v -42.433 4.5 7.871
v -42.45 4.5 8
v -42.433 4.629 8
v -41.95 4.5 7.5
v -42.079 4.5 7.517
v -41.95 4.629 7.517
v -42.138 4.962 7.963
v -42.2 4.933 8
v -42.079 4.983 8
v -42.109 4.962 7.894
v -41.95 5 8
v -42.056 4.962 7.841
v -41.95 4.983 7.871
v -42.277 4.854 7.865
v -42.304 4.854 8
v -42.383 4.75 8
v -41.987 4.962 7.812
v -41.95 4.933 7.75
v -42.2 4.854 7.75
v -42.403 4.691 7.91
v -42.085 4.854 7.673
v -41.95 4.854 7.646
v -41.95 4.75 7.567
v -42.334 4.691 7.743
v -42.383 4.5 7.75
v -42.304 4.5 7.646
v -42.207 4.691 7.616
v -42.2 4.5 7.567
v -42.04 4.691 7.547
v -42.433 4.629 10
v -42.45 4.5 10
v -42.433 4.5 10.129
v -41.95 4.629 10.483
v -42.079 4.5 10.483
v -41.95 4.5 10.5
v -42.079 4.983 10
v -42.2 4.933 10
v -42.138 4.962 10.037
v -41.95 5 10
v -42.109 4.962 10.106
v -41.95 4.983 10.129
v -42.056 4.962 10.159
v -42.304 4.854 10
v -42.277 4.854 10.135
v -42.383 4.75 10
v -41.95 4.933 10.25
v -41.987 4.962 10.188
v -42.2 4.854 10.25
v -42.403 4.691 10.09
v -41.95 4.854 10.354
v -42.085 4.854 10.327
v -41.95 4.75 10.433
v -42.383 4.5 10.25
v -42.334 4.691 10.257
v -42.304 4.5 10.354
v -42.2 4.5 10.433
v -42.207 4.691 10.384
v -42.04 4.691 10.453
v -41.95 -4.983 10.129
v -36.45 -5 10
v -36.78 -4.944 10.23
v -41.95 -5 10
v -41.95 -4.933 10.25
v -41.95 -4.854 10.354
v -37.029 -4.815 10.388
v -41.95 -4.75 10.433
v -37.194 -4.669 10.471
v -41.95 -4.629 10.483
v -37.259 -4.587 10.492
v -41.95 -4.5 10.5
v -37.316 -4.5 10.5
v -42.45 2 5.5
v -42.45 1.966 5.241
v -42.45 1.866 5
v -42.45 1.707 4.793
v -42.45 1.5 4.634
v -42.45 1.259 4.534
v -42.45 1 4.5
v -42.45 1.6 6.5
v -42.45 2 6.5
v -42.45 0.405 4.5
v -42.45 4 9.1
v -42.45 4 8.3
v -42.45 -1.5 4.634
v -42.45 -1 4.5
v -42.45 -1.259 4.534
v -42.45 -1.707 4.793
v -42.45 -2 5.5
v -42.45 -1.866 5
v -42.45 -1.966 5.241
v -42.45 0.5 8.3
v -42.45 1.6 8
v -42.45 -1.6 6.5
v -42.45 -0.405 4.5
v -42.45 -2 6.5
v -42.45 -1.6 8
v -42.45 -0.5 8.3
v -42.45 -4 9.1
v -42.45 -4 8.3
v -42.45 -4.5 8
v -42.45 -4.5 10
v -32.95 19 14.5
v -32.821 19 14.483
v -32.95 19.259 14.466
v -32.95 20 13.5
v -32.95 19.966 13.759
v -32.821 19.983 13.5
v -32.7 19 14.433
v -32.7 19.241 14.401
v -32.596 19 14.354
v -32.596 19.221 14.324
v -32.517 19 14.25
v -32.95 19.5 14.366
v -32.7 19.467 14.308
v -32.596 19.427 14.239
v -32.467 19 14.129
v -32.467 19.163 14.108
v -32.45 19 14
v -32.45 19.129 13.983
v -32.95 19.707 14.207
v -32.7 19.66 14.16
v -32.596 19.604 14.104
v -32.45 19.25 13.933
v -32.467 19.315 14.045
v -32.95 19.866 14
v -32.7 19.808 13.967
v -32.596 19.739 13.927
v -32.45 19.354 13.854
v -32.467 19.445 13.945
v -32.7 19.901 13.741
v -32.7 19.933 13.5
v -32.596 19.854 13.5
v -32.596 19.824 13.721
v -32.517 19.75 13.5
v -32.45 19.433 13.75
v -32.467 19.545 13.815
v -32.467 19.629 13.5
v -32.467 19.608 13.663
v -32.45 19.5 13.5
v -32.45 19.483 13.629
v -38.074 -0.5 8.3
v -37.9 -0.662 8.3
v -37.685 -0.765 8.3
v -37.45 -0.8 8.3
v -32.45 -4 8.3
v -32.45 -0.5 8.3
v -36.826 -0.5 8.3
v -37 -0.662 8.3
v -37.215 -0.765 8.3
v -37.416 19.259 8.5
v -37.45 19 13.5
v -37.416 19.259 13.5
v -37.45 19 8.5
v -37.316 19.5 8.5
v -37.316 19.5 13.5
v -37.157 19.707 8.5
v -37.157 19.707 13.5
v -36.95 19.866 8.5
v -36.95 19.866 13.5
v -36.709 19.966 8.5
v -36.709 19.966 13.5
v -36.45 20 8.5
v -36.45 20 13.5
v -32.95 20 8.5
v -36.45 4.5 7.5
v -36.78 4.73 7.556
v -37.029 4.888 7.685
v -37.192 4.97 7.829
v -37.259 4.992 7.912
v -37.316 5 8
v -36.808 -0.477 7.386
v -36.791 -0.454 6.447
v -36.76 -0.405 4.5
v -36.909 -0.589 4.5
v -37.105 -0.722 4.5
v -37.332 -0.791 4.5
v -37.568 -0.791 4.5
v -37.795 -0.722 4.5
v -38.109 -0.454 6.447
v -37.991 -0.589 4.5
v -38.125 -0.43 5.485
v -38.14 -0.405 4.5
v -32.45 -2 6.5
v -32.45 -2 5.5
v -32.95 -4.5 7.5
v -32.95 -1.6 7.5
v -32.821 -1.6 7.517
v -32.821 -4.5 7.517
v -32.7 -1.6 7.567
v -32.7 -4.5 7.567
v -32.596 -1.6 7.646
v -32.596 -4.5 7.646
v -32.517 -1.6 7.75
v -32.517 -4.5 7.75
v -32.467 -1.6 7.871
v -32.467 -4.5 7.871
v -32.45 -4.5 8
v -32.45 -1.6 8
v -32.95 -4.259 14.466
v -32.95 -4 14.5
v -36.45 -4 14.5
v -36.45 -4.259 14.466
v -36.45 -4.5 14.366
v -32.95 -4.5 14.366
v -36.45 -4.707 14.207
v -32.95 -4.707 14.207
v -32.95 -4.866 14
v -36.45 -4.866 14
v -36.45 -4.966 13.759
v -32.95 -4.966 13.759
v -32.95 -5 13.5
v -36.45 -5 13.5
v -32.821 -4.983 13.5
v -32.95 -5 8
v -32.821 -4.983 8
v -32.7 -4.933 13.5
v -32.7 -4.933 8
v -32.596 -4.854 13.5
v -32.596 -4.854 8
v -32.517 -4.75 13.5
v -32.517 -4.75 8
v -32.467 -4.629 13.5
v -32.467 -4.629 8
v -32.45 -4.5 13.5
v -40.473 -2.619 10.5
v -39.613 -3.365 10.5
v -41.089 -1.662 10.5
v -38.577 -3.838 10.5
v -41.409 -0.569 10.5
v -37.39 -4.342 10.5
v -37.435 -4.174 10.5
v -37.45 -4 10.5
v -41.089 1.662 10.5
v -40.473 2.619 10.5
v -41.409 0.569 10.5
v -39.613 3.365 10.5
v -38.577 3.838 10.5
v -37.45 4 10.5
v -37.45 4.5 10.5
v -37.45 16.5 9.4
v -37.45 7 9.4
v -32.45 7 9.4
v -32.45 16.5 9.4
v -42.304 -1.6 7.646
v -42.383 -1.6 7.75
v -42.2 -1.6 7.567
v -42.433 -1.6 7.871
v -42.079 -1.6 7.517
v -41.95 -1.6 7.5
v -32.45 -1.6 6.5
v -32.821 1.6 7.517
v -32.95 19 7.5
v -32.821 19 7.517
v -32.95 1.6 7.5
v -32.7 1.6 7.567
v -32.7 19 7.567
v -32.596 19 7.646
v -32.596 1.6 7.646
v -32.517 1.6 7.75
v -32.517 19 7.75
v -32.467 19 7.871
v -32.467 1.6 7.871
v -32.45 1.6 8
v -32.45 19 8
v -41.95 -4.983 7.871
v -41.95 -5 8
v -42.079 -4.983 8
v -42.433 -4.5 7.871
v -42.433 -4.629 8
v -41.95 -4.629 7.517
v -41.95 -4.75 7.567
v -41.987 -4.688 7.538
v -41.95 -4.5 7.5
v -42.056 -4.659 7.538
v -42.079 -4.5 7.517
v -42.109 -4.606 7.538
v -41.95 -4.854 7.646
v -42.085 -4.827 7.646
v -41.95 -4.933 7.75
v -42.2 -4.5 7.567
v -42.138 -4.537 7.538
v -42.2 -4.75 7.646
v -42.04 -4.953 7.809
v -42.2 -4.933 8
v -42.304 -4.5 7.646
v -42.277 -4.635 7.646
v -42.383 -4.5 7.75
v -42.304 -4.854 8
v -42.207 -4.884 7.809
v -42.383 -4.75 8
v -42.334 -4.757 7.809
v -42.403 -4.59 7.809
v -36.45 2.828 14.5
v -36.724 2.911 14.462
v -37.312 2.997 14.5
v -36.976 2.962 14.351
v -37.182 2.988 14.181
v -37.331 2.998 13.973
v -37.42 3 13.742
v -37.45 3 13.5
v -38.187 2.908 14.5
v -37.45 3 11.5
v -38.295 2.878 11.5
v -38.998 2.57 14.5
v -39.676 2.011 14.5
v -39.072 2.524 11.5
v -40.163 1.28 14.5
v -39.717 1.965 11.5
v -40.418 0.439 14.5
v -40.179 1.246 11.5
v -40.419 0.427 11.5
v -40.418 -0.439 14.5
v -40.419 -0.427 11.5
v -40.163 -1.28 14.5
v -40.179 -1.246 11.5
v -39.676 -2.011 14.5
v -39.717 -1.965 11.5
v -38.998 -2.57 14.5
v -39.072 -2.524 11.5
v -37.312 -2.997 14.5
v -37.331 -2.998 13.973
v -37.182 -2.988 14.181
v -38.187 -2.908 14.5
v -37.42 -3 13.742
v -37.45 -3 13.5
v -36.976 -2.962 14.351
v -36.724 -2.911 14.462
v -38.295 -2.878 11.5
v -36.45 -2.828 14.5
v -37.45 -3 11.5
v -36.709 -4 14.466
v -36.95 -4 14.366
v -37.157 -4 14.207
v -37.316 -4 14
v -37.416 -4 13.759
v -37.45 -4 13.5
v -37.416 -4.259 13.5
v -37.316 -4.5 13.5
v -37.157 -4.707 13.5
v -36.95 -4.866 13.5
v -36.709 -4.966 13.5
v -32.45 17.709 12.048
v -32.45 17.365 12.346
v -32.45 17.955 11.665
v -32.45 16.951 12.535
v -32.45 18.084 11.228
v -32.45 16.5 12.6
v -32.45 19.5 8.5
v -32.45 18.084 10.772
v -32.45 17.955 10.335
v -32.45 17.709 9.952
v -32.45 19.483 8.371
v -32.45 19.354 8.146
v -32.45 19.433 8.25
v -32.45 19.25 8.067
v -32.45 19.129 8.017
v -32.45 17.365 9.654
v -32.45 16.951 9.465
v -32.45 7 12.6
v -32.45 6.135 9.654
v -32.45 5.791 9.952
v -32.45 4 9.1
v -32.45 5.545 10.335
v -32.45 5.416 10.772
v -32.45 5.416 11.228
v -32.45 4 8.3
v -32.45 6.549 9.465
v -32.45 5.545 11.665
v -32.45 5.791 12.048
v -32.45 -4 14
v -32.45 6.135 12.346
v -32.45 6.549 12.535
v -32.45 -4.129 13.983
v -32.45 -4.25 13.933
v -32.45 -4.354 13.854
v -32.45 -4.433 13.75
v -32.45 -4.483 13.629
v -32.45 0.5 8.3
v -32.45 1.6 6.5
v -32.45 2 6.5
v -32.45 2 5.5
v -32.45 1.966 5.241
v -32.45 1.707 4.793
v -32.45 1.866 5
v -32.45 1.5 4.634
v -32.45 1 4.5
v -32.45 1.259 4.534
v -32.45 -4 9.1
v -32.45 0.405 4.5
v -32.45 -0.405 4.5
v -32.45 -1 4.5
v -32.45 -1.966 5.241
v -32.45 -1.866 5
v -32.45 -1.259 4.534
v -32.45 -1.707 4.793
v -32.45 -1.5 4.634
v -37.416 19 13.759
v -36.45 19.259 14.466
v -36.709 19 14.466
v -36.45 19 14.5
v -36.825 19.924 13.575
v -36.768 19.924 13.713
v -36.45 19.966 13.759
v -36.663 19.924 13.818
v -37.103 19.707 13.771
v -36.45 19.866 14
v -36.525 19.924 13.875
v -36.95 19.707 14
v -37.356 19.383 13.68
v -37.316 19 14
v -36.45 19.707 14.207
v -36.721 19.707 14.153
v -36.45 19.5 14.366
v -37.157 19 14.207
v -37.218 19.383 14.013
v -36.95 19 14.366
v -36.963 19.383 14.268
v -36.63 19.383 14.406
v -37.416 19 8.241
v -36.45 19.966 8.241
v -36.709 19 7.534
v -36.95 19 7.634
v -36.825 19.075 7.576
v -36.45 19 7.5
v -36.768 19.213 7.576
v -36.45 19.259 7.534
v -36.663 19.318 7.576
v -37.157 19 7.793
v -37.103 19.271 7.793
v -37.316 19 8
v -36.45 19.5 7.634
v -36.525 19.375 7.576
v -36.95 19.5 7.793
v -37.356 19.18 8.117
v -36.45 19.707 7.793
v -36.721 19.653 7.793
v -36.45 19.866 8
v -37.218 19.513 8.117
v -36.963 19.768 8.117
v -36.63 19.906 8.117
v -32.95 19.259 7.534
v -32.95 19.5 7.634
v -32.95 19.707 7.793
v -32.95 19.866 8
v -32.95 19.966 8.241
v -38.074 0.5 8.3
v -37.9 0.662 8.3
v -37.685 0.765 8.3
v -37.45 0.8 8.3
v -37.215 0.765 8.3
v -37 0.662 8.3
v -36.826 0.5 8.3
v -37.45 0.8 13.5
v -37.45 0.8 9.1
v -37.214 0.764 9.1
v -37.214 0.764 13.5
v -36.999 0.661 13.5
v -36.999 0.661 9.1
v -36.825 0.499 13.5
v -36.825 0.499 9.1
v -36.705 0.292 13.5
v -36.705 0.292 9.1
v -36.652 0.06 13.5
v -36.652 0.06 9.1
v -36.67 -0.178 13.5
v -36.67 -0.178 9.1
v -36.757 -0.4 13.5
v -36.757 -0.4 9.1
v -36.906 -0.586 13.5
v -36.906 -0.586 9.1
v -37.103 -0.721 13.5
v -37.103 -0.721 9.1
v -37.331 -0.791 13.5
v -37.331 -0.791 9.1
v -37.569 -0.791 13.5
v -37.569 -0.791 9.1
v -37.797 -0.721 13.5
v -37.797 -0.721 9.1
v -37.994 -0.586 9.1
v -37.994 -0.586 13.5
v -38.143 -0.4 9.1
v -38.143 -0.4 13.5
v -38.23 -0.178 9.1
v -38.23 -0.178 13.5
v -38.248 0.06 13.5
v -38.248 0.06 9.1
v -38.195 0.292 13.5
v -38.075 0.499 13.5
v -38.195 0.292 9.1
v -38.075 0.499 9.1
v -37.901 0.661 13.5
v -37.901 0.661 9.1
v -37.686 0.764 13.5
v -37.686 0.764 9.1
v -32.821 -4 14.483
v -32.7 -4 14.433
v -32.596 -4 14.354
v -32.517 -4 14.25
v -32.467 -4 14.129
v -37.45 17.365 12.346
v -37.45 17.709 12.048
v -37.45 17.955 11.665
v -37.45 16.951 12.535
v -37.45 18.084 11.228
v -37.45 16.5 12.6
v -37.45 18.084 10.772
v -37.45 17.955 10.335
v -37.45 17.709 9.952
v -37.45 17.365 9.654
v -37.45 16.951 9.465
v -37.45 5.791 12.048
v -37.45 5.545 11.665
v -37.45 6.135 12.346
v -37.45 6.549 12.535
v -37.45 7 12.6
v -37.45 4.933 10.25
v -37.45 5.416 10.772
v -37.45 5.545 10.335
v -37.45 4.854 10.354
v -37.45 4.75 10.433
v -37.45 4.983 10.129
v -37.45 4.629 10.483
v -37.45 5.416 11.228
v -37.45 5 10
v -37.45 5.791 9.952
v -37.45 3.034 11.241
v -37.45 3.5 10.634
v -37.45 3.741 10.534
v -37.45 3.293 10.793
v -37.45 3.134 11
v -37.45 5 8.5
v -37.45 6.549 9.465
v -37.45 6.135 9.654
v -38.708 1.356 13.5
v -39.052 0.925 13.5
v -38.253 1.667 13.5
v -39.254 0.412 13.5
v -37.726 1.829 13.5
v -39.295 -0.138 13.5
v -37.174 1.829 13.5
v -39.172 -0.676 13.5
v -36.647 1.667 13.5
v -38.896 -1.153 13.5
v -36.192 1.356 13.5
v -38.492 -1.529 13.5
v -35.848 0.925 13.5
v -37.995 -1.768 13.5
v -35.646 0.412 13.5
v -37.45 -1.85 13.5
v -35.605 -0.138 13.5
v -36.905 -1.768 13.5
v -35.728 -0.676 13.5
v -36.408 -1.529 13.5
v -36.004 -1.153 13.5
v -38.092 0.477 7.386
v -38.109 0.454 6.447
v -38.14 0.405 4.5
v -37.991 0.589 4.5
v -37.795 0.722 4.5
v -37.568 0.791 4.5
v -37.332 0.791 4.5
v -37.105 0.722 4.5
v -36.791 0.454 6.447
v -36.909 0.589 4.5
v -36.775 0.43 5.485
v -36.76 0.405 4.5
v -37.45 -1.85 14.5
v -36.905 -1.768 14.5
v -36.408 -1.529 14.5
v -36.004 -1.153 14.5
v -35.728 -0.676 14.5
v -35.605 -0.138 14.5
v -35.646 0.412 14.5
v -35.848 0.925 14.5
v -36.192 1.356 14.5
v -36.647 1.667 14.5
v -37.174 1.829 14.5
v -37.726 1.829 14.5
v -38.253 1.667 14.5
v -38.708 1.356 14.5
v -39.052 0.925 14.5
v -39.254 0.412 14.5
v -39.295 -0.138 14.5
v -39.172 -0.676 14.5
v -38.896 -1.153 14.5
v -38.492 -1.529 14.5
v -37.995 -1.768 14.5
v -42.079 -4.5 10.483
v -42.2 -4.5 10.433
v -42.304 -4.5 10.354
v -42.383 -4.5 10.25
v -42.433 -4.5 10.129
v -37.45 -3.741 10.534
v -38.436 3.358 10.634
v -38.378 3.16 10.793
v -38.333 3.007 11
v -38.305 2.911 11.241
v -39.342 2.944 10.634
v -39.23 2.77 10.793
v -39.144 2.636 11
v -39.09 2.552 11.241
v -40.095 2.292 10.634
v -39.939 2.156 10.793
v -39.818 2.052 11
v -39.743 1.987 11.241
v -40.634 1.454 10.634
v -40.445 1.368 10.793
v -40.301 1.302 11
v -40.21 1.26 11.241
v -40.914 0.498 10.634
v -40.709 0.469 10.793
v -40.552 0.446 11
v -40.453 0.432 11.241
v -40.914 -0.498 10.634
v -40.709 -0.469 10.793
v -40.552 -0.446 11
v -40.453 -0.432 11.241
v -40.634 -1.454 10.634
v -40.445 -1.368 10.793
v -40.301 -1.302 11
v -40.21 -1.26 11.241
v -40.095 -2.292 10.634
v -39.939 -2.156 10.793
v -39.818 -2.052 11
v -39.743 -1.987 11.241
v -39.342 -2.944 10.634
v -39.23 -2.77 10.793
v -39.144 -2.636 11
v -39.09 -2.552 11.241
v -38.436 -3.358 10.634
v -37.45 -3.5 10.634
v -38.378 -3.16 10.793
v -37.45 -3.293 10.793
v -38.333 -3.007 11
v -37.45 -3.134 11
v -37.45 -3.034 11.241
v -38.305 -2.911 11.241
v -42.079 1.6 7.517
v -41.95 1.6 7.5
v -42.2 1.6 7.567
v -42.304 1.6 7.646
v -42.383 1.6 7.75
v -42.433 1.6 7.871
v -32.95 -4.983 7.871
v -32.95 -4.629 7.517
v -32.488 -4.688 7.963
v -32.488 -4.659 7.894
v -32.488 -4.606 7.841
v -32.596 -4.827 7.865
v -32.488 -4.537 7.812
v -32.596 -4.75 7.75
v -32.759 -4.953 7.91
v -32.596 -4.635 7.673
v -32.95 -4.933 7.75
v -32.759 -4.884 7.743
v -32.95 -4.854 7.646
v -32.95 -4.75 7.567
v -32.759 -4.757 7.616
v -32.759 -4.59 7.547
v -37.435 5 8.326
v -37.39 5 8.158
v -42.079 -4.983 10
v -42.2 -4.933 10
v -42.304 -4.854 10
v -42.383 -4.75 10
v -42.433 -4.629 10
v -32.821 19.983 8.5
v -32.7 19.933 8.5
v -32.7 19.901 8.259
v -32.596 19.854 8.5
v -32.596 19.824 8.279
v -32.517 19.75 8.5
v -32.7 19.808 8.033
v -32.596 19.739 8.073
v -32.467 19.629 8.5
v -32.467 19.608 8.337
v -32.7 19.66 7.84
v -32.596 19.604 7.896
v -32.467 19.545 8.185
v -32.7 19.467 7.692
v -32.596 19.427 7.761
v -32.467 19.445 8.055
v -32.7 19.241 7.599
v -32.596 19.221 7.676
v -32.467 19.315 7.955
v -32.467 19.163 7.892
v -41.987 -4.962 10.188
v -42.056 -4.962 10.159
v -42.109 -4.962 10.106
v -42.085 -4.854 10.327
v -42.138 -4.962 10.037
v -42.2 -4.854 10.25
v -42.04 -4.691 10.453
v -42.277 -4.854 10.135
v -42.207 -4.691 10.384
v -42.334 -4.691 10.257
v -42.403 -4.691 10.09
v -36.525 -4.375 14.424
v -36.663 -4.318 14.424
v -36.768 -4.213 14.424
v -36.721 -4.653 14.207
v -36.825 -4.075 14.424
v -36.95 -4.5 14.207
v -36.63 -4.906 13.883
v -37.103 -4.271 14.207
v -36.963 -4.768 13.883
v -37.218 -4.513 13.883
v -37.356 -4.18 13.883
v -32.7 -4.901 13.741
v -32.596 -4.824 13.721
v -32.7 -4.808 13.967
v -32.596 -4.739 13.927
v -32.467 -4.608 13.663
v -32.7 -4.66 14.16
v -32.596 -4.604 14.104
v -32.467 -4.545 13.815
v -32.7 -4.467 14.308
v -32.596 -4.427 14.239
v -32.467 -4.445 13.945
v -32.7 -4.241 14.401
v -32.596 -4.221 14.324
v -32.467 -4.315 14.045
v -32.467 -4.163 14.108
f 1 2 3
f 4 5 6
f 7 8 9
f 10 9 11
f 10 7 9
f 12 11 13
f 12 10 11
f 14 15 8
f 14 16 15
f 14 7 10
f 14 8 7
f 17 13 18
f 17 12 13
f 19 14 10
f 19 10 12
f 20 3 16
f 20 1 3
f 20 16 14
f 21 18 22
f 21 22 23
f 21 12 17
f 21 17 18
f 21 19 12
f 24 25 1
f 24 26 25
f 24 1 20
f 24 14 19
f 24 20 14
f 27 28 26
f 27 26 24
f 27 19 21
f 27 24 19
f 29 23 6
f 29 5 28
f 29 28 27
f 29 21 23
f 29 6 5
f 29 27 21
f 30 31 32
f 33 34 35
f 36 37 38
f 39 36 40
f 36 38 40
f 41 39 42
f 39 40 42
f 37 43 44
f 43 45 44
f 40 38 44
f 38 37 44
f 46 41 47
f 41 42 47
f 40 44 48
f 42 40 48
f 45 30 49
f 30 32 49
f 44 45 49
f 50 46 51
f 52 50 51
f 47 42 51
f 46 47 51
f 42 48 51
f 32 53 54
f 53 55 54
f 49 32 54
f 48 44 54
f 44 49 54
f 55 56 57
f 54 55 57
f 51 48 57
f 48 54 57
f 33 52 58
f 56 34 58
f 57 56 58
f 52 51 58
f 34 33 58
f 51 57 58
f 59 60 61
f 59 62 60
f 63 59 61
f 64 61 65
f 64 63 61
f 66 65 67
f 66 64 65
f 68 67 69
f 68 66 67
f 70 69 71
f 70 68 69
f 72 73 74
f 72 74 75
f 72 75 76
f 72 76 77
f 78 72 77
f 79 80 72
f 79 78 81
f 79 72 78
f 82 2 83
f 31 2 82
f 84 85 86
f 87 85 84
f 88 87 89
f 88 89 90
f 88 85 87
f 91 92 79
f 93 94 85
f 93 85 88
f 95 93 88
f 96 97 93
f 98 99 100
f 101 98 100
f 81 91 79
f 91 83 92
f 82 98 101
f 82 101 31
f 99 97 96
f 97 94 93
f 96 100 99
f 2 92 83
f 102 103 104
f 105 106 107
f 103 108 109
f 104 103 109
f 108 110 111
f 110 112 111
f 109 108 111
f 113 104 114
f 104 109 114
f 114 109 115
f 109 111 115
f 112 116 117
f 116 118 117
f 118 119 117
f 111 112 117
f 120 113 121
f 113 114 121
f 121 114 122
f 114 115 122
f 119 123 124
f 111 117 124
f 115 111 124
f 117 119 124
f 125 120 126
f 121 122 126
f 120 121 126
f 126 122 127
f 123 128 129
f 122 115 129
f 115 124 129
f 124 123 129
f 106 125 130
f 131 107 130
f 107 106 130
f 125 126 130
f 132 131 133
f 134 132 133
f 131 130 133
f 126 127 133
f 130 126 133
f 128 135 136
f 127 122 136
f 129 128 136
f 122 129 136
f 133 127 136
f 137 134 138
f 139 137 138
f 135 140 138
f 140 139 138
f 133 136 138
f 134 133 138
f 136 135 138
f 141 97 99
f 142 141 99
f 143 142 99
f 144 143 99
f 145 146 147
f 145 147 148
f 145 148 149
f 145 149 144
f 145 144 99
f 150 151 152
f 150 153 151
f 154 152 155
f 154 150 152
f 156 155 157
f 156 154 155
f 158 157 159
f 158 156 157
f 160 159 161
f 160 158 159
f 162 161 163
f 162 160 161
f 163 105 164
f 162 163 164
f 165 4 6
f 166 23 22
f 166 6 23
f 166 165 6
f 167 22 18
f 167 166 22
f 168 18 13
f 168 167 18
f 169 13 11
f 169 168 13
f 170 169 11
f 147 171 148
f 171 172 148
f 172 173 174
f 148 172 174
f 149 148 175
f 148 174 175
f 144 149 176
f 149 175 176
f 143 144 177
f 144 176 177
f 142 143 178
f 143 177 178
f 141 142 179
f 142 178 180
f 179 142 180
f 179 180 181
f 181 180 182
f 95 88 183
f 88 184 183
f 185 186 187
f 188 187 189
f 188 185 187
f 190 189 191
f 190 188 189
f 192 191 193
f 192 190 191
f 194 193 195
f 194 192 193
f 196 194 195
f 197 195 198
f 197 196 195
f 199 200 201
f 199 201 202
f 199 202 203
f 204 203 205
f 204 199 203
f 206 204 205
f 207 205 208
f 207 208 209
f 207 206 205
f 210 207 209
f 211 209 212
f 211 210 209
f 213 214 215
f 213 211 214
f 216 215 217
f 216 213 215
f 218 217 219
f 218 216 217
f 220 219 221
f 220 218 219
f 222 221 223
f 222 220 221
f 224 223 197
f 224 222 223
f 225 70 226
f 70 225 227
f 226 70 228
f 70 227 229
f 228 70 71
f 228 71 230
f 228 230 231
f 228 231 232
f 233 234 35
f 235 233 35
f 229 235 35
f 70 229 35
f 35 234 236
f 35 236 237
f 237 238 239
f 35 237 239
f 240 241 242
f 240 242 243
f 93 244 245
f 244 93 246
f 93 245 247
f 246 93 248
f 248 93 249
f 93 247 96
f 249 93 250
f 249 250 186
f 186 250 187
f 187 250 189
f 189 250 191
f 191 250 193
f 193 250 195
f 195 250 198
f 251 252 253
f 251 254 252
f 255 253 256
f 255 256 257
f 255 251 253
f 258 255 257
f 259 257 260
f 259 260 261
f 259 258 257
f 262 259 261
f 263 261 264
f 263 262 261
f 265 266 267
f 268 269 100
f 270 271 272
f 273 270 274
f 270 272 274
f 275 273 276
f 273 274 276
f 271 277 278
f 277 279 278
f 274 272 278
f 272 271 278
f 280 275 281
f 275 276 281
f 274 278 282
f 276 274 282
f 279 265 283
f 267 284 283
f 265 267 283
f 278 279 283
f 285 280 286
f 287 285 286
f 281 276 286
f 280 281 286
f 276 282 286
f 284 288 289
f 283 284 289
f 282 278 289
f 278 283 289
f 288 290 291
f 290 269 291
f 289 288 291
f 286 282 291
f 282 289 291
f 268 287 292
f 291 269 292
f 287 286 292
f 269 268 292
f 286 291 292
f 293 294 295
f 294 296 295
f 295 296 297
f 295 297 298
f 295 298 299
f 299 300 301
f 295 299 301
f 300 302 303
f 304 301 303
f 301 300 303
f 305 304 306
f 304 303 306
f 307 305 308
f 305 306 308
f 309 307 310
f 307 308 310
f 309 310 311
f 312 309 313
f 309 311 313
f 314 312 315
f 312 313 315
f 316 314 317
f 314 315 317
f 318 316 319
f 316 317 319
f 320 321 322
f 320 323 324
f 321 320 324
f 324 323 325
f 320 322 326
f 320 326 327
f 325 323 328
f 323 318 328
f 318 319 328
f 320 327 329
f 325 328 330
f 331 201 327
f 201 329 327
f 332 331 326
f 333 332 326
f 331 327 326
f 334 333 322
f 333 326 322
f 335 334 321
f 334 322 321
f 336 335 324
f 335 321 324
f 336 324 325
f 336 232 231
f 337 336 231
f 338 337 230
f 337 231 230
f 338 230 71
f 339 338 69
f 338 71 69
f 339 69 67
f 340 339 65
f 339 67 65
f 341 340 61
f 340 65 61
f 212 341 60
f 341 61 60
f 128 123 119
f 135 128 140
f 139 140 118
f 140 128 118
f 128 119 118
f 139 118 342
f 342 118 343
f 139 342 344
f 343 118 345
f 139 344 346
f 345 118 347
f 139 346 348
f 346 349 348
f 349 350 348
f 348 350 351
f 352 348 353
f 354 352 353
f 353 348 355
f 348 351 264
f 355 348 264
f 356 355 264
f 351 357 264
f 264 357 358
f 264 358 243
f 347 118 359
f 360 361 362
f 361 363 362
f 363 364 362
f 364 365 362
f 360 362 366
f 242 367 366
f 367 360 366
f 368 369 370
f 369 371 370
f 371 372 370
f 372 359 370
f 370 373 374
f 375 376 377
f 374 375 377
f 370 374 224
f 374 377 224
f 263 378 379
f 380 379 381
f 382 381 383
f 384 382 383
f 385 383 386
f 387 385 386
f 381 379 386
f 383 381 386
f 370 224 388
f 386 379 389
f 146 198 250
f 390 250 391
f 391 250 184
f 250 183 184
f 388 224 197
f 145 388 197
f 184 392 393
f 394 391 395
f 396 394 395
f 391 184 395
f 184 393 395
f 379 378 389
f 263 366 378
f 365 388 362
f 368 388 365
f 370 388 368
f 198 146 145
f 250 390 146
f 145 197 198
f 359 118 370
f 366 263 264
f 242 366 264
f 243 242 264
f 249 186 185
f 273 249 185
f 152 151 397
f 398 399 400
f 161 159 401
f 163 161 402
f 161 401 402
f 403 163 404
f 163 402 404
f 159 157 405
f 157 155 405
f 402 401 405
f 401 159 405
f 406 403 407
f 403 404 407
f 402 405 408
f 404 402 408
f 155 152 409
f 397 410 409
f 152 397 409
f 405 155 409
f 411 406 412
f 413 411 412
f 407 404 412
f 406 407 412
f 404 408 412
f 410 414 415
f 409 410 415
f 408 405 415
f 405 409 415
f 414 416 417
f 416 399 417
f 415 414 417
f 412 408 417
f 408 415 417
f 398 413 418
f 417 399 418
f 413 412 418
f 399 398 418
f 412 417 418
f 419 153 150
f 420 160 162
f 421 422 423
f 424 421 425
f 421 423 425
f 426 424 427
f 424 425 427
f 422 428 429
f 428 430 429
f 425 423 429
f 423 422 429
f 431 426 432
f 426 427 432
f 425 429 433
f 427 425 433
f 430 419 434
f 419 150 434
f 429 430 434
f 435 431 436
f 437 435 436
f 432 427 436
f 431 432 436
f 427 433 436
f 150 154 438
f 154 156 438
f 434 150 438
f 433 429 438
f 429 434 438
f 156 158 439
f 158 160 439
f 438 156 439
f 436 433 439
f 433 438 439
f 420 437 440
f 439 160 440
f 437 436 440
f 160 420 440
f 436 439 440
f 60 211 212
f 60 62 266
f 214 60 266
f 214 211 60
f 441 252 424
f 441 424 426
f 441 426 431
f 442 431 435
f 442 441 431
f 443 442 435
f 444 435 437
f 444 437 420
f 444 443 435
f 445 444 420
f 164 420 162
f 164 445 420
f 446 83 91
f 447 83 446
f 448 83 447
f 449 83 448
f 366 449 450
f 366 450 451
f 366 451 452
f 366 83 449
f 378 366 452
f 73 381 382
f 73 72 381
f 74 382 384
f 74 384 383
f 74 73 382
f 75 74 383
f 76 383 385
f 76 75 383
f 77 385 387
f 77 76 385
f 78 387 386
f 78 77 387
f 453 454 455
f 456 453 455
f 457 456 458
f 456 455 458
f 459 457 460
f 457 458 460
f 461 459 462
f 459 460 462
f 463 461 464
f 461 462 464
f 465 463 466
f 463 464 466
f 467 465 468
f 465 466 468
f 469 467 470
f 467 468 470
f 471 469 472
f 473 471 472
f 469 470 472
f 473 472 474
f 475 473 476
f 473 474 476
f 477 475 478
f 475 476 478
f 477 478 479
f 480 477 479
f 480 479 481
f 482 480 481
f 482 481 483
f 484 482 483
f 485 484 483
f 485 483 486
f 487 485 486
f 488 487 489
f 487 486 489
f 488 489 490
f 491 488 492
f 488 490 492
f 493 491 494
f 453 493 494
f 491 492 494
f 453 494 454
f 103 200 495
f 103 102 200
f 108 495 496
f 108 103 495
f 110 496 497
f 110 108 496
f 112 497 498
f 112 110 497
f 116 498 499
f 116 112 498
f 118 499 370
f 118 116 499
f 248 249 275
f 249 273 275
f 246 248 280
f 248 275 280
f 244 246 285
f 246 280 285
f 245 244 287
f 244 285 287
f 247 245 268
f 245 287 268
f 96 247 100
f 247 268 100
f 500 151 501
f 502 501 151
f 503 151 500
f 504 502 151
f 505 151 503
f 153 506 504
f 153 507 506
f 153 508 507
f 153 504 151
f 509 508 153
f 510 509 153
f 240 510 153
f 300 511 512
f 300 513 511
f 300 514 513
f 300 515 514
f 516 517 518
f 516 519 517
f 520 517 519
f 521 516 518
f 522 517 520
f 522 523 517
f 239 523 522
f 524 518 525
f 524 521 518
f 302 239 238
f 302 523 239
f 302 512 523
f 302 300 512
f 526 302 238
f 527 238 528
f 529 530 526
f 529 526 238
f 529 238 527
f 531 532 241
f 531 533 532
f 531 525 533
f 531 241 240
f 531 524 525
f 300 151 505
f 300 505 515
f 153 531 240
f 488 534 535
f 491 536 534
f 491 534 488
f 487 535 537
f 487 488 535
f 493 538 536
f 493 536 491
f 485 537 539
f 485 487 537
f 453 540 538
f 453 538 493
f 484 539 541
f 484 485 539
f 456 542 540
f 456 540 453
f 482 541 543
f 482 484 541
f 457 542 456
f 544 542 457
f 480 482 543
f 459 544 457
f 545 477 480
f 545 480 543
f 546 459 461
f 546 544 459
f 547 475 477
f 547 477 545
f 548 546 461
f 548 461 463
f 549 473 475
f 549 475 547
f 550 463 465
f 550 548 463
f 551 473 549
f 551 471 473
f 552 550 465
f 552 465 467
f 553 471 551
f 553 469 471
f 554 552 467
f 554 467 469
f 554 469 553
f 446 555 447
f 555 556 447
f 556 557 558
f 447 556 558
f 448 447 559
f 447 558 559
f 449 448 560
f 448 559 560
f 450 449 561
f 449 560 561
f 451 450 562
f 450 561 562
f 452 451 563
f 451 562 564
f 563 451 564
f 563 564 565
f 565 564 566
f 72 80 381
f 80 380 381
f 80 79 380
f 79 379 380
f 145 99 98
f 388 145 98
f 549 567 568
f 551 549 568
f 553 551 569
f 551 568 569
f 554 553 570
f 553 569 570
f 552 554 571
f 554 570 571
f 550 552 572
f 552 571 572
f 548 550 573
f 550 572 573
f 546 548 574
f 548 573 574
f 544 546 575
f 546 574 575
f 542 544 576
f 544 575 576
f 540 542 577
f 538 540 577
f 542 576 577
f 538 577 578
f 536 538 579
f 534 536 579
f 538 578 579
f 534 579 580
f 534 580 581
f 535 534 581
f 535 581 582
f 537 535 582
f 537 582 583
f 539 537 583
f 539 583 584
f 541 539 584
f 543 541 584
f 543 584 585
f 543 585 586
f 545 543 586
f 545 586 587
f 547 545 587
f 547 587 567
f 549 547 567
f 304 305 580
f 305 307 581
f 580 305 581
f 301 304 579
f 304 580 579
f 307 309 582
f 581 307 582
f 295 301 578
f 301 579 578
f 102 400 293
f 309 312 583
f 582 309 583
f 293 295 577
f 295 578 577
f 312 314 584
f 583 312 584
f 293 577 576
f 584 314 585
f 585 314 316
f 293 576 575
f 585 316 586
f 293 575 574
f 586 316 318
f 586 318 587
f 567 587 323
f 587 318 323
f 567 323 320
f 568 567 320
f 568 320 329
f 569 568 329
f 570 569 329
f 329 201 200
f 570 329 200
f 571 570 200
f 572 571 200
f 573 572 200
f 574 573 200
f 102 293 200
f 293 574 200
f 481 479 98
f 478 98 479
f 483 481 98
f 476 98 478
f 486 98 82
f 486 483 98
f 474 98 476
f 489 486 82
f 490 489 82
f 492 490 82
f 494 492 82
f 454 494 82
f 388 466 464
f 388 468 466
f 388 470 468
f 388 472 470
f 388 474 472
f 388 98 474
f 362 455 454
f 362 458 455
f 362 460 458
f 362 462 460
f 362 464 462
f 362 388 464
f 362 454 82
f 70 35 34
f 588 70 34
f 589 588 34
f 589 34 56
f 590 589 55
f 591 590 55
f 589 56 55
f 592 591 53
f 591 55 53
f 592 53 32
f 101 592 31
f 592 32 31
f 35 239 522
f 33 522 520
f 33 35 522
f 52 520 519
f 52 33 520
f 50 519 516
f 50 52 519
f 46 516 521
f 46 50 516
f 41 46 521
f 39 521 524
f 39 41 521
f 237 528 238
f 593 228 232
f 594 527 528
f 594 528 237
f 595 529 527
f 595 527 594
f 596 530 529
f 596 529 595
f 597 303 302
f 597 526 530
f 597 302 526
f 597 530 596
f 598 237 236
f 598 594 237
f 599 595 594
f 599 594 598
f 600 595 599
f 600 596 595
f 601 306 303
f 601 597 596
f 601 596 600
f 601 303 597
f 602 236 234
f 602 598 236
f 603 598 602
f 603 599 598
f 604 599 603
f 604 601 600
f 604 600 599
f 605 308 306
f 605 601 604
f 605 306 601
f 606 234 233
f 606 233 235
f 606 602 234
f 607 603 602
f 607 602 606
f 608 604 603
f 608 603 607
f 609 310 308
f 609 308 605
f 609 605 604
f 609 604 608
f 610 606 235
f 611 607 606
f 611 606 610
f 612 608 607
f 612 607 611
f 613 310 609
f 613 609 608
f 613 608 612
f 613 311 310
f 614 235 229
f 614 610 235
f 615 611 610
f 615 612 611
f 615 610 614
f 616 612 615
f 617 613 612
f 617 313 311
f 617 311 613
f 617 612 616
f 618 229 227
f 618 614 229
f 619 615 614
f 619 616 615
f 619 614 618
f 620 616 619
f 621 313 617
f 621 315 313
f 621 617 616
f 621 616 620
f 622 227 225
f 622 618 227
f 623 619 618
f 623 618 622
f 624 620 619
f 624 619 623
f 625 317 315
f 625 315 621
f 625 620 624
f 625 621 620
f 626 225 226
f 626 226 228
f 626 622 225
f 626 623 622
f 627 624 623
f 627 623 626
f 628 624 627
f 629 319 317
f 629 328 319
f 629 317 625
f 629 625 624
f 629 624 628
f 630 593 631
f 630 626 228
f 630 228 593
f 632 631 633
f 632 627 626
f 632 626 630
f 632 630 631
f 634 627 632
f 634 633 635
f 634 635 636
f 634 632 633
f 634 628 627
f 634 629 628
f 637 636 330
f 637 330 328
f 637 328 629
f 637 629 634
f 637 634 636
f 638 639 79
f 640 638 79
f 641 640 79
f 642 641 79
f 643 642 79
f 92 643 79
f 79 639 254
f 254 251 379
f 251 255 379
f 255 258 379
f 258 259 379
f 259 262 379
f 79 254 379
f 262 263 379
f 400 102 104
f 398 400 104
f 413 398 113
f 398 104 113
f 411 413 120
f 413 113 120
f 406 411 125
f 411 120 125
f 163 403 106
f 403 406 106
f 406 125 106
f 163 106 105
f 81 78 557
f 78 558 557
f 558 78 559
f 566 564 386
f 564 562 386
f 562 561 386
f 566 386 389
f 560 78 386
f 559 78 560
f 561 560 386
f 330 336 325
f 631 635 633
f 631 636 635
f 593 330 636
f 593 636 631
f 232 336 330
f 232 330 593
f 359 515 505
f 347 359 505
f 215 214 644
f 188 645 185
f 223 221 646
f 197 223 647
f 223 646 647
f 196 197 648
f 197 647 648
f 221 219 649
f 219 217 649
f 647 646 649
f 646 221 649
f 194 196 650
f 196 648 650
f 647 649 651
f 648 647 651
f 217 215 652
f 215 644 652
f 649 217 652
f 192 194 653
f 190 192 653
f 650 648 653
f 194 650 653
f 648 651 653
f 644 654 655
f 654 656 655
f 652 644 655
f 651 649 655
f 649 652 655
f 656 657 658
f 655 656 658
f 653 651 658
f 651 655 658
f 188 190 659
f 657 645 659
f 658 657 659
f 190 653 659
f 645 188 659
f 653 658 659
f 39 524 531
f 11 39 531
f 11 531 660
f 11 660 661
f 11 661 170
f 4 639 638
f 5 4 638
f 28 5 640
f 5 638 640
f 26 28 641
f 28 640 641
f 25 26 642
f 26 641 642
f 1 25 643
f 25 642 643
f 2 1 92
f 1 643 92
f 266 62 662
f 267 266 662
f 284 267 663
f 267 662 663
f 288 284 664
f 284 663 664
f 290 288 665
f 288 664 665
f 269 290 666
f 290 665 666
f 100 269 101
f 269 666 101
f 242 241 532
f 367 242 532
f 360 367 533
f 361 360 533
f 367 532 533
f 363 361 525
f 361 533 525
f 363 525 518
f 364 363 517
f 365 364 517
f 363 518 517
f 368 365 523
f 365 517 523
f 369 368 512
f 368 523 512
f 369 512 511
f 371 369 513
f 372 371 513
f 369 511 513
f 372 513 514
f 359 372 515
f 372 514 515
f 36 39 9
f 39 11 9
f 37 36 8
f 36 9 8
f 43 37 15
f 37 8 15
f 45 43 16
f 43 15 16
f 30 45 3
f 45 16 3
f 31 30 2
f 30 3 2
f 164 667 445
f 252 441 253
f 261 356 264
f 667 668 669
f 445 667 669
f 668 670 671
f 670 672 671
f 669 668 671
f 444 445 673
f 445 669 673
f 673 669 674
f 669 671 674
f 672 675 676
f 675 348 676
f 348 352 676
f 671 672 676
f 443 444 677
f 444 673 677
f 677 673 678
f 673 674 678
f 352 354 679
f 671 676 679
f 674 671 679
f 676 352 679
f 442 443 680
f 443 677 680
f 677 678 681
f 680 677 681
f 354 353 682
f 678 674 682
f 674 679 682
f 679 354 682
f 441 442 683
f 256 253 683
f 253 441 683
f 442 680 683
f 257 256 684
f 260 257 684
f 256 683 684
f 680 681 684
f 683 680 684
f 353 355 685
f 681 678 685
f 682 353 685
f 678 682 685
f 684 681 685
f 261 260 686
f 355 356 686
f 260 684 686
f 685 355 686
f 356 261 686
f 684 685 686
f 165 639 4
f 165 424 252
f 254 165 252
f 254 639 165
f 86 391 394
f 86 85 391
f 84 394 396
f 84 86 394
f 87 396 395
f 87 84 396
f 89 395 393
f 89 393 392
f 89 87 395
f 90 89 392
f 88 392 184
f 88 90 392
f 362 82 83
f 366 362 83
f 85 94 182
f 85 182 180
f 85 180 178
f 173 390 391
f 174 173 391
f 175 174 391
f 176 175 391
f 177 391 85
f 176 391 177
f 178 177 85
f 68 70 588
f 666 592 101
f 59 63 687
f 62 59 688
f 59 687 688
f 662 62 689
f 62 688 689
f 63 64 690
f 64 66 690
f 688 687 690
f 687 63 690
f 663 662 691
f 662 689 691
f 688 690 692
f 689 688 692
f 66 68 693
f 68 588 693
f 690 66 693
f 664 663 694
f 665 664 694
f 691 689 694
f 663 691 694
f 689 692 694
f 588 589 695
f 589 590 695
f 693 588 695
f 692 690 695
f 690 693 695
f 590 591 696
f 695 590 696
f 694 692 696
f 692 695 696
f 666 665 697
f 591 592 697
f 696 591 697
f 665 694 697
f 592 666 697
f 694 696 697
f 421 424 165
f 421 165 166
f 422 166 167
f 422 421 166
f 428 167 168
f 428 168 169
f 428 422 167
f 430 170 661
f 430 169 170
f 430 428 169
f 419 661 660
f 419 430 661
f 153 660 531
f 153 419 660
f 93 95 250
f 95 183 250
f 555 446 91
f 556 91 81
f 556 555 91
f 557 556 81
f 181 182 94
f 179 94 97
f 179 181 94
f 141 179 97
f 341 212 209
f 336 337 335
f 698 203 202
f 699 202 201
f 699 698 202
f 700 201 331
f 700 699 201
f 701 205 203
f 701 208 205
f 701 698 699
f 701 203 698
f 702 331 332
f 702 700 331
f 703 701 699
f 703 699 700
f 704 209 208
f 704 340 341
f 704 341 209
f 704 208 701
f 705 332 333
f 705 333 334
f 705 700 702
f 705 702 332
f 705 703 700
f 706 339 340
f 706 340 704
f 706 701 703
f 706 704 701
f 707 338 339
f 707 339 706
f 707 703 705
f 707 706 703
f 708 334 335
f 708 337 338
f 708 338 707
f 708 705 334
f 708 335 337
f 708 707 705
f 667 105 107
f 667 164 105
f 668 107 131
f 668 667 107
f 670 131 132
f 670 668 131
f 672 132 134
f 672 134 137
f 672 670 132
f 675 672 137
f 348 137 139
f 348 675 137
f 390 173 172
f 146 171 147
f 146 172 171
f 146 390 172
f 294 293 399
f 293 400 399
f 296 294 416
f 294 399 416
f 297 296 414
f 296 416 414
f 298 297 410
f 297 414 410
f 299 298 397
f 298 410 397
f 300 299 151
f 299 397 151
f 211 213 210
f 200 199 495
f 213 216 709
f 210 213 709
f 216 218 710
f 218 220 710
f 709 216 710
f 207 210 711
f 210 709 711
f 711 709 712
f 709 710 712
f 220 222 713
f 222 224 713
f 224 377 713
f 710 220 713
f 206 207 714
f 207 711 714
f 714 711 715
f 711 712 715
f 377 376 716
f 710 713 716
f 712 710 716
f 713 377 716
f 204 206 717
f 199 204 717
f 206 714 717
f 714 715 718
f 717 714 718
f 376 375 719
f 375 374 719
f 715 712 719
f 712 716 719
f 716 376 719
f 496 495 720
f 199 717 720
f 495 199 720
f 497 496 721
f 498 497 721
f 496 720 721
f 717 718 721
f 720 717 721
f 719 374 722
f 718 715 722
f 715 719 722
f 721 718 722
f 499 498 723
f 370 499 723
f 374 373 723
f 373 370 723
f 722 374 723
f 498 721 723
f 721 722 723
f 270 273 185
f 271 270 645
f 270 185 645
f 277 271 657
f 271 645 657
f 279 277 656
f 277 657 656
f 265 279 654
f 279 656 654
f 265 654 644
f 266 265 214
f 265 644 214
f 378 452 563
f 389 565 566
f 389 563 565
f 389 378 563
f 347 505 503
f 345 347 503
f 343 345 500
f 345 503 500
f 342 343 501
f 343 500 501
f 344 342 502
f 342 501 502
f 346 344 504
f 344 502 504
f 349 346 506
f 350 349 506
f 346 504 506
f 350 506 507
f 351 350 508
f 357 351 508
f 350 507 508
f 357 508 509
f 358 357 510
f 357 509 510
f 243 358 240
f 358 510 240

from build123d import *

# Parameters (mm, degrees)
PAD019_DEPTH        = 5
SKETCH042_R         = 3
PAD023_DEPTH        = 4
FILLET018_R         = 1
SKETCH041_W         = 7
SKETCH041_H         = 5
PAD024_DEPTH        = 25
HOLE007_D           = 1.6
HOLE007_CBORE_D     = 3.7
HOLE007_CBORE_DEPTH = 1
POCKET018_DEPTH     = 5.001
POCKET019_DEPTH     = 10.001
FILLET019_R         = 1
FILLET020_R         = 0.5
FILLET021_R         = 1


with BuildPart() as part:
    # Sketch033 → Pad019 (new body, symmetric)
    with BuildSketch(Plane.YZ):
        Polygon((-5, 7.5), (-5, 10.5), (5, 10.5), (5, 7.5), (1.6, 7.5), (1.6, 6.5), (2, 6.5), (2, 4.5), (-2, 4.5), (-2, 6.5), (-1.6, 6.5), (-1.6, 7.5), align=None)
    extrude(amount=PAD019_DEPTH, both=True)

    # Sketch042 (on Face2 of Pad019) → Pad023 (join)
    with BuildSketch(Plane(origin=(0, 0, 10.5), x_dir=(0, -1, 0), z_dir=(0, 0, 1))):
        Circle(SKETCH042_R)
    extrude(amount=PAD023_DEPTH)

    # Fillet018
    fillet018_edges = [part.edges().sort_by_distance(p)[0] for p in [
        (0, 3, 10.5),
    ]]
    fillet(fillet018_edges, radius=FILLET018_R)

    # Sketch041 (on DatumPlane) → Pad024 (join)
    with BuildSketch(Plane(origin=(0, -5, 0), x_dir=(0, 0, -1), z_dir=(0, -1, 0))):
        with Locations((-11, 2.5)):
            Rectangle(SKETCH041_W, SKETCH041_H)
    extrude(amount=-PAD024_DEPTH)

    # Hole007 (through all)
    with Locations(Plane(origin=(0, 0, 14.5), x_dir=(0, -1, 0), z_dir=(0, 0, 1))):
        with Locations((0, 0)):
            CounterBoreHole(HOLE007_D / 2, HOLE007_CBORE_D / 2, HOLE007_CBORE_DEPTH)

    # Sketch044 (on DatumPlane) → Pocket018 (cut, through all)
    with BuildSketch(Plane(origin=(0, 0, 0), x_dir=(0, 1, 0), z_dir=(-1, 0, 0))):
        with BuildLine():
            ThreePointArc((7, -9.4), (5.4, -11), (7, -12.6))
            Line((7, -12.6), (16.5, -12.6))
            ThreePointArc((16.5, -12.6), (18.1, -11), (16.5, -9.4))
            Line((7, -9.4), (16.5, -9.4))
        make_face()
    extrude(amount=-POCKET018_DEPTH, mode=Mode.SUBTRACT)

    # Sketch034 → Pocket019 (cut, through all)
    with BuildSketch(Plane.YZ.offset(5)):
        Polygon((0.5, 8.3), (0.4, 4.3), (-0.4, 4.3), (-0.5, 8.3), (-4, 8.3), (-4, 9.1), (4, 9.1), (4, 8.3), align=None)
    extrude(amount=-POCKET019_DEPTH, mode=Mode.SUBTRACT)

    # Fillet019
    fillet019_edges = [part.edges().sort_by_distance(p)[0] for p in [
        (0, -5, 12.5),
        (2.5, -5, 14.5),
        (0, 11.5, 14.5),
        (0, -4, 14.5),
        (0, 20, 11),
        (0, 12.5, 7.5),
        (2.5, 20, 14.5),
        (2.5, 20, 7.5),
    ]]
    fillet(fillet019_edges, radius=FILLET019_R)

    # Fillet020
    fillet020_edges = [part.edges().sort_by_distance(p)[0] for p in [
        (-5, 0, 10.5),
        (-2.5, -5, 10.5),
        (0.5, -5, 10.5),
        (-5, -5, 9),
        (0, -5, 7.5),
        (-5, -3.3, 7.5),
        (-5, 3.3, 7.5),
        (-5, 5, 9),
        (-2.5, 5, 10.5),
        (-2.5, 5, 7.5),
        (0.5, 5, 7.5),
        (5, 20, 11),
        (5, 19.707107, 7.792893),
        (5, 10.3, 7.5),
        (5, -3.3, 7.5),
        (5, -5, 10.5),
        (5, -4.707107, 14.207107),
        (5, 7.5, 14.5),
        (5, 19.707107, 14.207107),
    ]]
    fillet(fillet020_edges, radius=FILLET020_R)

    # Fillet021
    fillet021_edges = [part.edges().sort_by_distance(p)[0] for p in [
        (0, -2, 4.5),
        (0, 2, 4.5),
    ]]
    fillet(fillet021_edges, radius=FILLET021_R)


with BuildPart() as part_1:
    # Body004 placement: moved
    add(part.part.moved(Location((-37.45, 0, 0))))


solid = part_1.part
